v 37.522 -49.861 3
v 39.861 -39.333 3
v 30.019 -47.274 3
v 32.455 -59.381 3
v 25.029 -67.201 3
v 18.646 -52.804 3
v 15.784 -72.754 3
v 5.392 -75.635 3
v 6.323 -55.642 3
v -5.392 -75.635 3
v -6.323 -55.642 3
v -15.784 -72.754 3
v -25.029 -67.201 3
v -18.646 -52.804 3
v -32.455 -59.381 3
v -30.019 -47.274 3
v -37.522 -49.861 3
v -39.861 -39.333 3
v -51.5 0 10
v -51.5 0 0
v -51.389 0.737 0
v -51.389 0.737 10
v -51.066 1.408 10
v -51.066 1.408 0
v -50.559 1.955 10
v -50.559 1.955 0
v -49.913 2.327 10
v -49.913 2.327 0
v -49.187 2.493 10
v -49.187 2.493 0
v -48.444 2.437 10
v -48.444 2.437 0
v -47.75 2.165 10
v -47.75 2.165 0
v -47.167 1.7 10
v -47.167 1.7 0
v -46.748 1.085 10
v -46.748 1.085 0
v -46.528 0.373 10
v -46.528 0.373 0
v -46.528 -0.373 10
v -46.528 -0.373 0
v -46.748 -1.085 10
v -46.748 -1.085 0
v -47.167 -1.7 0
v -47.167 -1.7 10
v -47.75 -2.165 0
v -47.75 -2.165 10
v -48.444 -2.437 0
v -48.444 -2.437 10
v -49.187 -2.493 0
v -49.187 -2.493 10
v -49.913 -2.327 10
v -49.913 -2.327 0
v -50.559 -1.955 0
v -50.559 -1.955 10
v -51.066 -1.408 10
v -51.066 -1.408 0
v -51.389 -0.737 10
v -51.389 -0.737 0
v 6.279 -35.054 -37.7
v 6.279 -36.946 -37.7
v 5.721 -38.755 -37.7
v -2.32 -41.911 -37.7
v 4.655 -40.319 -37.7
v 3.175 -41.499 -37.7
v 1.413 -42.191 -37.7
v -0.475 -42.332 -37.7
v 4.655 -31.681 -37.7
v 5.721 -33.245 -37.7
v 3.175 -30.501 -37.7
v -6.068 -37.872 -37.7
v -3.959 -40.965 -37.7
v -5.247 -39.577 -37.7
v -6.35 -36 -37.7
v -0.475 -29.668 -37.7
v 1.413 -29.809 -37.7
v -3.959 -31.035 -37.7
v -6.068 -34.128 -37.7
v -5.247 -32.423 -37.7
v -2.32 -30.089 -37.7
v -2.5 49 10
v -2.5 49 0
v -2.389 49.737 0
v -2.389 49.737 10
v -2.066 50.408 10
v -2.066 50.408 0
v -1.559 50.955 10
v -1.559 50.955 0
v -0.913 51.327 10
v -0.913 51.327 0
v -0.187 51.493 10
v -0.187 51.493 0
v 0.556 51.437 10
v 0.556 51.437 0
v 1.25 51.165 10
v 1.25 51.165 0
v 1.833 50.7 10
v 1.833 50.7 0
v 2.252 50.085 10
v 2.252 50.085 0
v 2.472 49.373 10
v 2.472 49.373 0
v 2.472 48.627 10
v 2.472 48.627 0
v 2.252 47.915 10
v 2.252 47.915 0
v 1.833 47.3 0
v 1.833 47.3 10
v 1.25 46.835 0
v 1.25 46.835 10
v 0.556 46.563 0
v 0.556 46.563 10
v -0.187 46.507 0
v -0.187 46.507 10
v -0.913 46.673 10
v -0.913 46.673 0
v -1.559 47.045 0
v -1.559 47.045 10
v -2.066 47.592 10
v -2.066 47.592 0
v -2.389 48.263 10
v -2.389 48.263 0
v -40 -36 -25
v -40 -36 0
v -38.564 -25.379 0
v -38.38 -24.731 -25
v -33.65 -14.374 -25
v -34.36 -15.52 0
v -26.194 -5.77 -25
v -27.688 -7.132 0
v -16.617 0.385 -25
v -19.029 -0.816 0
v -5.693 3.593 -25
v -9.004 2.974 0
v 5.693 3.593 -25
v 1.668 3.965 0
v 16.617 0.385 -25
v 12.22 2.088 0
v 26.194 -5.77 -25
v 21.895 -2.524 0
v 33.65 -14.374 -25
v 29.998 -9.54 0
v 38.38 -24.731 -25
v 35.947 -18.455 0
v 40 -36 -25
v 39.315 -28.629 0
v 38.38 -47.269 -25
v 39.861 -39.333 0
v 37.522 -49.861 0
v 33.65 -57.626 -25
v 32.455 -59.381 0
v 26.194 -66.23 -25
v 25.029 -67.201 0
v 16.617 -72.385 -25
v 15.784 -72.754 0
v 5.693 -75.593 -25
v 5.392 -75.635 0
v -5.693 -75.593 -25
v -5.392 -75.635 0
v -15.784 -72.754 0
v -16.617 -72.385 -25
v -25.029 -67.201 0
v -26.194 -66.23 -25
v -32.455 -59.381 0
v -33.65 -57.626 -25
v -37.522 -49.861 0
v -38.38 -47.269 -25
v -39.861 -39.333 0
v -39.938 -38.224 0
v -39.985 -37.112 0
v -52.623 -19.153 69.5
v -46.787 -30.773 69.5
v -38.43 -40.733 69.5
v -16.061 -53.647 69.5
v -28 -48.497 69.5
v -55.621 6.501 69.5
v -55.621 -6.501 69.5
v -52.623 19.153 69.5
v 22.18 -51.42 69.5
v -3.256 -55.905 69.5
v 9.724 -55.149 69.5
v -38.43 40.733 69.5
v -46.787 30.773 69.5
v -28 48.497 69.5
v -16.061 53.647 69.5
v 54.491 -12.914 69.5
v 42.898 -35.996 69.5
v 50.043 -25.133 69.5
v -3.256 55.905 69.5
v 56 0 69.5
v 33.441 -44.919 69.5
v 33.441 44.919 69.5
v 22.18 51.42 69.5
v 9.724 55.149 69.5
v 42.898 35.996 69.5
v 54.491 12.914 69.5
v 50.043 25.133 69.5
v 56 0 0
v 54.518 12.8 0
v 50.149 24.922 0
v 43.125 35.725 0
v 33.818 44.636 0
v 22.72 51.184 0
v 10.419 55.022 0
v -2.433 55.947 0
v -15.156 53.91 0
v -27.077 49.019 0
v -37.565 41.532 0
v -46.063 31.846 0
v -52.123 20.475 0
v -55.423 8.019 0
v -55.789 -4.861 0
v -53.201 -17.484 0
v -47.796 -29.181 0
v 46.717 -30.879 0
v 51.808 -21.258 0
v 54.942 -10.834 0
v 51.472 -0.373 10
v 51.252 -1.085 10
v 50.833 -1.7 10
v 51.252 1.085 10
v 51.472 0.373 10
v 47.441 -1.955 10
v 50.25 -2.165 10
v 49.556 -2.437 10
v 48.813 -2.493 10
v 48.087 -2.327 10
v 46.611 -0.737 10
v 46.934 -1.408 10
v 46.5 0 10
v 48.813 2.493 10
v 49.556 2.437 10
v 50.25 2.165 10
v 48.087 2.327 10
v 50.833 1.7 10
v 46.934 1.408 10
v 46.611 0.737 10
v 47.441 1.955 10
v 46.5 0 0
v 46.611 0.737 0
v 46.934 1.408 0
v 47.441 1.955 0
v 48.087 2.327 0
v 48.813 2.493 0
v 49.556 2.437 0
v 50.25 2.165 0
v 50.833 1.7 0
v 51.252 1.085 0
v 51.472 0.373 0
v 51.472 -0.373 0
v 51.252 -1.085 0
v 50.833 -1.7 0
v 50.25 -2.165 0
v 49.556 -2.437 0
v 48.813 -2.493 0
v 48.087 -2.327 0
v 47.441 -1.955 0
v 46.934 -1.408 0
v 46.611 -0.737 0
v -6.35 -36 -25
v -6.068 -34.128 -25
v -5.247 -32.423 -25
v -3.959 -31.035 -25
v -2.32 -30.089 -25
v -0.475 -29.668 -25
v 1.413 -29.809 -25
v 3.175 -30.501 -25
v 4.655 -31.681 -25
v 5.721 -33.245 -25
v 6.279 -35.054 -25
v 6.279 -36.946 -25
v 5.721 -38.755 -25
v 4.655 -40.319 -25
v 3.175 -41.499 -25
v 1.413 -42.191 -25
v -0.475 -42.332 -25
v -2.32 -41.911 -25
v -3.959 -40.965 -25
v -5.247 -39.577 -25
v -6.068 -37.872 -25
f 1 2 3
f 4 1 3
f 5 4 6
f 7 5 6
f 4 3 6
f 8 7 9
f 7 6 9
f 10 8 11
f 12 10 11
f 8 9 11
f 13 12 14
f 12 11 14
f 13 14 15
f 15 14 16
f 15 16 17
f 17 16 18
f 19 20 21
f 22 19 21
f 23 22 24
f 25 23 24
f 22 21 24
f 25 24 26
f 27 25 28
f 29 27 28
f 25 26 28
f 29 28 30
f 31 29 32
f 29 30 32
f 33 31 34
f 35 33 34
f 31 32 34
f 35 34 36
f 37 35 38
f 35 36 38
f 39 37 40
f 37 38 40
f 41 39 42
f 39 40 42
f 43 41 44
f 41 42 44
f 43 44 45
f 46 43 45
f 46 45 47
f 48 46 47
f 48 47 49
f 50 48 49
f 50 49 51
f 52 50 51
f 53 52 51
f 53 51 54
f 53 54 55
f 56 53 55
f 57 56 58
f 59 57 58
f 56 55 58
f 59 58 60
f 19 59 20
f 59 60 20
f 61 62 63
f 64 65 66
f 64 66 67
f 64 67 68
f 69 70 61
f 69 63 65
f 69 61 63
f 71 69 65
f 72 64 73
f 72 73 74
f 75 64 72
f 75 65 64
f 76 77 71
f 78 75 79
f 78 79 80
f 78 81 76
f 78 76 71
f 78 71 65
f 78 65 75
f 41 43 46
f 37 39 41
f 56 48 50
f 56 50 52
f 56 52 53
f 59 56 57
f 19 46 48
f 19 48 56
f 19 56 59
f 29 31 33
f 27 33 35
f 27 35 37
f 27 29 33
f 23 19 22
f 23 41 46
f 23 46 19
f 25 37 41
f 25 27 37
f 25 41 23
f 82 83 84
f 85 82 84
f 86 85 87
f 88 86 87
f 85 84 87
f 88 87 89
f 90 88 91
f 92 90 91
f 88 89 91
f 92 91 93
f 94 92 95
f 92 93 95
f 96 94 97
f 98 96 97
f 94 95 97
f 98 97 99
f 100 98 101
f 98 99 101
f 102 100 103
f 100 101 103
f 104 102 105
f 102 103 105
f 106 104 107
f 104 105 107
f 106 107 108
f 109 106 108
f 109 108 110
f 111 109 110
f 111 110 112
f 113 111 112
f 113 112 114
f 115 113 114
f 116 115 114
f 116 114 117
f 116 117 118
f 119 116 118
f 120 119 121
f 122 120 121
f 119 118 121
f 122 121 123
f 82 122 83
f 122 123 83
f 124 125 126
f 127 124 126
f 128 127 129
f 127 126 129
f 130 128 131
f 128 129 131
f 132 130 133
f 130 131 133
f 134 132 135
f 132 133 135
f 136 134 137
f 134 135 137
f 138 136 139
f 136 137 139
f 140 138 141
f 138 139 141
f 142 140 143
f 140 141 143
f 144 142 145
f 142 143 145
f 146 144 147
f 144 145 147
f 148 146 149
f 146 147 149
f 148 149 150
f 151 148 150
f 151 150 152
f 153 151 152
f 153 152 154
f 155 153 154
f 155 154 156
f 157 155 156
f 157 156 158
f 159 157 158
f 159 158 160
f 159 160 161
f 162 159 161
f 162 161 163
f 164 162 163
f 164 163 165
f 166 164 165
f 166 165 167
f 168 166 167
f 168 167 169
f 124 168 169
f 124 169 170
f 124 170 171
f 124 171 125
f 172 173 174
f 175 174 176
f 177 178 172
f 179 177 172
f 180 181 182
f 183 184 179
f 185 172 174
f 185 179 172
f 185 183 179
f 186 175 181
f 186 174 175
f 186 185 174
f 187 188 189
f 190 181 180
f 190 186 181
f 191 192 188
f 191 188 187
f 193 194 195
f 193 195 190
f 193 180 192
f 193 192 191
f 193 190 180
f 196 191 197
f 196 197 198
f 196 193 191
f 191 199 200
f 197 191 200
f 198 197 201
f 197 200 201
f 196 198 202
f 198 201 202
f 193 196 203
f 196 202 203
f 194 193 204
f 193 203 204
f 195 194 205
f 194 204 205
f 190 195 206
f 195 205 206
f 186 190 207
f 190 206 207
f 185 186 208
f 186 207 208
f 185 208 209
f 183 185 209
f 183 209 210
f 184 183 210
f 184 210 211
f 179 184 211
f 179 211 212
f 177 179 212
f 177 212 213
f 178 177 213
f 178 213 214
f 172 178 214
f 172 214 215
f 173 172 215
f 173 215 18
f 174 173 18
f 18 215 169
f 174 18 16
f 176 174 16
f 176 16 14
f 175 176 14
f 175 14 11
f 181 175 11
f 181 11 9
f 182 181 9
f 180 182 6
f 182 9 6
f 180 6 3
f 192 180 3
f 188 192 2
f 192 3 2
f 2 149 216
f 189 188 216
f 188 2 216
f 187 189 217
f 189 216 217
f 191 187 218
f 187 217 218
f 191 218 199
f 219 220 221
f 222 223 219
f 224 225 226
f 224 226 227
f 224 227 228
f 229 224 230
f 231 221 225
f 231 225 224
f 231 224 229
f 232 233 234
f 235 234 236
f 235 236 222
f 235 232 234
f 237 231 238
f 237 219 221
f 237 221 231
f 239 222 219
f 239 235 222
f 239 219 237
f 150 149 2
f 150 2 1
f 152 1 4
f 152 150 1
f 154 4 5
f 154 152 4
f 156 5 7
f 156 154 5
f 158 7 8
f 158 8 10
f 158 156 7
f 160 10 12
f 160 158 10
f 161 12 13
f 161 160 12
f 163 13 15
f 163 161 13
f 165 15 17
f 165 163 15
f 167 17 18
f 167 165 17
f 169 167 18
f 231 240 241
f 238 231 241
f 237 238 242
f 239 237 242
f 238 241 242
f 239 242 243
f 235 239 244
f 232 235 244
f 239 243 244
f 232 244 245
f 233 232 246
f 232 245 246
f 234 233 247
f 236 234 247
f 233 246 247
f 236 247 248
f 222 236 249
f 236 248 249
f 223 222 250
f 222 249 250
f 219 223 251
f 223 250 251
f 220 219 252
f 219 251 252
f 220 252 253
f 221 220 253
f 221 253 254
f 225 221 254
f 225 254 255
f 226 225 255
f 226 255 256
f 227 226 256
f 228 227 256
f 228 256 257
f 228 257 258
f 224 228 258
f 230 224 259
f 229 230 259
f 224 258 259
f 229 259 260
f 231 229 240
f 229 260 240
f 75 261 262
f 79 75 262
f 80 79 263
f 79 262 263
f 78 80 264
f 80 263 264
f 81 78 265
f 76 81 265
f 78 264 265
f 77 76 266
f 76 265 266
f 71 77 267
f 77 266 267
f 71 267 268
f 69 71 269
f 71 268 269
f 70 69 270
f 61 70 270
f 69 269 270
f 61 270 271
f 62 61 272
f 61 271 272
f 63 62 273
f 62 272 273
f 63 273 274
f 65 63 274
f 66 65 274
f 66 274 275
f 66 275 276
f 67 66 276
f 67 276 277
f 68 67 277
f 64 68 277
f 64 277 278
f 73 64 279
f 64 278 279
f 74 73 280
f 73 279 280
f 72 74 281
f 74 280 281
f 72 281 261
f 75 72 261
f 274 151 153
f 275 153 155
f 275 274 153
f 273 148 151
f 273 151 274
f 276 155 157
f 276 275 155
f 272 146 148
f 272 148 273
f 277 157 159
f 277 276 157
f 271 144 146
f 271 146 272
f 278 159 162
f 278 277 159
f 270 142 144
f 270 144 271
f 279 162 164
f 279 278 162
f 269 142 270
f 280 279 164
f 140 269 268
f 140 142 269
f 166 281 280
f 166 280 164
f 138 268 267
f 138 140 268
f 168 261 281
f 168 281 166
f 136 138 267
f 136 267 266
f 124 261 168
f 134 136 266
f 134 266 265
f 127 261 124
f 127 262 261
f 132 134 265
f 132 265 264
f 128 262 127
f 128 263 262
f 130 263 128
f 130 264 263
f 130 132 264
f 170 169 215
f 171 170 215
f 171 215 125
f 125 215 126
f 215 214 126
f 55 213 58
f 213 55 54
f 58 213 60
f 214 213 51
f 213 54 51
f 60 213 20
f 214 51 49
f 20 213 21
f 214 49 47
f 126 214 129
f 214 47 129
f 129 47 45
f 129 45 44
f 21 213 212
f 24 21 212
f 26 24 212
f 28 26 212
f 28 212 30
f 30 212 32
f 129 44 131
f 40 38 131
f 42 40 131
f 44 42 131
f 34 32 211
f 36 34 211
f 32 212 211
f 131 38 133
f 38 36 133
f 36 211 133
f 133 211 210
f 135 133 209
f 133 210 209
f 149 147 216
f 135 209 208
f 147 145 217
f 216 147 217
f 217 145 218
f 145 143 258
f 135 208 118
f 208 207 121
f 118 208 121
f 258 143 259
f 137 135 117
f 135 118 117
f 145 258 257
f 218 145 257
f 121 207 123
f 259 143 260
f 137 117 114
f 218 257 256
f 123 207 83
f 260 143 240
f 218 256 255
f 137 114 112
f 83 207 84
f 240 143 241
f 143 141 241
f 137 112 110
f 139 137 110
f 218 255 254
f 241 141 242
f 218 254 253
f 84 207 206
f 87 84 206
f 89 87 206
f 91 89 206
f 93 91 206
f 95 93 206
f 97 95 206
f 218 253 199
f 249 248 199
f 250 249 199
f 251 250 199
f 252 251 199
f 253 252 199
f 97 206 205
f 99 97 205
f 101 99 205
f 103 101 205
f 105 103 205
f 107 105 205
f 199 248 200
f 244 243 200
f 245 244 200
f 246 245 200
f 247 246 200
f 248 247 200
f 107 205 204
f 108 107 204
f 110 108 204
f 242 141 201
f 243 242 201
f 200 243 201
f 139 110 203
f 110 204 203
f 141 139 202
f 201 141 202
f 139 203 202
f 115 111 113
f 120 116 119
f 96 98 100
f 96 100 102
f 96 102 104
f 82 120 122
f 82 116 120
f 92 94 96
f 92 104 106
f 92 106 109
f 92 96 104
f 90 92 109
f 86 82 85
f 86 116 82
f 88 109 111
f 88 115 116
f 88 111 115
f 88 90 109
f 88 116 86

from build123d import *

# Parameters (mm, degrees)
SKETCH1_R           = 56
EXTRUDE1_DEPTH      = 69.5
EXTRUDE2_DEPTH      = 25
EXTRUDE2_DEPTH_BACK = 3
SKETCH2_R           = 40
SKETCH3_R           = 2.5
CUT_EXTRUDE1_DEPTH  = 10
SKETCH4_R           = 6.35
EXTRUDE3_DEPTH      = 12.7


with BuildPart() as part:
    # Sketch1 → Extrude1 (new body)
    with BuildSketch(Plane.XY):
        Circle(SKETCH1_R)
    extrude(amount=EXTRUDE1_DEPTH)

    # Sketch2 → Extrude2 (add, two sides: drawn at the far end of the back side and taken through both)
    with BuildSketch(Plane(origin=(0, 0, 0), x_dir=(-1, 0, 0), z_dir=(0, 0, -1)).offset(-EXTRUDE2_DEPTH_BACK)):
        with Locations((0, -36)):
            Circle(SKETCH2_R)
    extrude(amount=EXTRUDE2_DEPTH + EXTRUDE2_DEPTH_BACK)

    # Sketch3 → Cut-Extrude1 (cut)
    with BuildSketch(Plane(origin=(0, 0, 0), x_dir=(-1, 0, 0), z_dir=(0, 0, -1))):
        with Locations((-49, 0)):
            Circle(SKETCH3_R)
        with Locations((0, 49)):
            Circle(SKETCH3_R)
        with Locations((49, 0)):
            Circle(SKETCH3_R)
    extrude(amount=-CUT_EXTRUDE1_DEPTH, mode=Mode.SUBTRACT)

    # Sketch4 → Extrude3 (add)
    with BuildSketch(Plane(origin=(0, 0, -25), x_dir=(-1, 0, 0), z_dir=(0, 0, -1))):
        with Locations((0, -36)):
            Circle(SKETCH4_R)
    extrude(amount=EXTRUDE3_DEPTH)


solid = part.part
